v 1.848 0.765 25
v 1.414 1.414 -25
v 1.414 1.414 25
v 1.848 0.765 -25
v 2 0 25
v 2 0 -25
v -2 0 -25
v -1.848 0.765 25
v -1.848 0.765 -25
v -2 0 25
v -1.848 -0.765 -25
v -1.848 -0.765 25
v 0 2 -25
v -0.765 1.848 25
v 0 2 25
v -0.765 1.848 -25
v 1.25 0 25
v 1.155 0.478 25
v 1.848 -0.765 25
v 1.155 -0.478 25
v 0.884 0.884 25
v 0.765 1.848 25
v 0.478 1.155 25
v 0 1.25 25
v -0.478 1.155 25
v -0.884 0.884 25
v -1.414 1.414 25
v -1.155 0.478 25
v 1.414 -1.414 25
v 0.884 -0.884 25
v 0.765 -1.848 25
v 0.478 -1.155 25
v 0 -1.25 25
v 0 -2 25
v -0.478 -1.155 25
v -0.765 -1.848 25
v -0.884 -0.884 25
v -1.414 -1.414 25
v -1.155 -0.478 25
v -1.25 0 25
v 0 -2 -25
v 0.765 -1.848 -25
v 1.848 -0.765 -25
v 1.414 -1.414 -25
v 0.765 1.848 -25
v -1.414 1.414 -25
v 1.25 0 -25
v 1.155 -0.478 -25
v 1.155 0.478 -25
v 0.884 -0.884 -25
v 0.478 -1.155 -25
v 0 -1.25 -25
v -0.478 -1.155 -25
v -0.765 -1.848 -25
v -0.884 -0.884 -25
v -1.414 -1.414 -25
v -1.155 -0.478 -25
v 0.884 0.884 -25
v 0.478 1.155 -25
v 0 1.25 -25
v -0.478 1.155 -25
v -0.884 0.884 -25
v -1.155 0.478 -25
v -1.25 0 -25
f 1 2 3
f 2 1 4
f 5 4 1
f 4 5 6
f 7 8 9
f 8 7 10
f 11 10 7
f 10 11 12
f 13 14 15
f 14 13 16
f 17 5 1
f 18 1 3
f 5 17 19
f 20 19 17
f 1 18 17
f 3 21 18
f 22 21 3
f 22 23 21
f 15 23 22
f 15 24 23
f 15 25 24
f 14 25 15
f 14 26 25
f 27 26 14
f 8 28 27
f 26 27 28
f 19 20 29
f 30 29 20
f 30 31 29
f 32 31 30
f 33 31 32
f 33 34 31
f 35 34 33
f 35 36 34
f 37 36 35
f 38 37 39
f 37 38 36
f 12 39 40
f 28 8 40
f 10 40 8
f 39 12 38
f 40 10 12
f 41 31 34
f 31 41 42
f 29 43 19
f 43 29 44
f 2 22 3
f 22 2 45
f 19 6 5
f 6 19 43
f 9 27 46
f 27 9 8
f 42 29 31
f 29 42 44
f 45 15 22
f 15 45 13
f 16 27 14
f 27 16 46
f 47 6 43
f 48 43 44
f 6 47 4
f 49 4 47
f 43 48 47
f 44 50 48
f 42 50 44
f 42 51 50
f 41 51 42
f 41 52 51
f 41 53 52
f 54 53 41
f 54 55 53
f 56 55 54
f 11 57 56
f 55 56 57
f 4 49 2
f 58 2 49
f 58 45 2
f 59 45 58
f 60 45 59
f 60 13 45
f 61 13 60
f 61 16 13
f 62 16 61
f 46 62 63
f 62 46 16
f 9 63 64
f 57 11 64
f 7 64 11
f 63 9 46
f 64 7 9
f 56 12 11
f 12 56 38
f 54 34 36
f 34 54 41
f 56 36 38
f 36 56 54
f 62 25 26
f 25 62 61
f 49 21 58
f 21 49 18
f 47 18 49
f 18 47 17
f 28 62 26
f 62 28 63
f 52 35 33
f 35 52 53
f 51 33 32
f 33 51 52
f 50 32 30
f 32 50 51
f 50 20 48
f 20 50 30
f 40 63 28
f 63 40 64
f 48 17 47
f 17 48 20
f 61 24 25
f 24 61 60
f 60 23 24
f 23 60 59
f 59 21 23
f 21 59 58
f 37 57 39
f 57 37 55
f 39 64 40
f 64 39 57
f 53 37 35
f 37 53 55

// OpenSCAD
// COBRA Tendon Guide - 50.0mm

$fn = 16;

difference() {
    cylinder(h=50.0, d=4, center=true);
    cylinder(h=52.0, d=2.5, center=true);
}
